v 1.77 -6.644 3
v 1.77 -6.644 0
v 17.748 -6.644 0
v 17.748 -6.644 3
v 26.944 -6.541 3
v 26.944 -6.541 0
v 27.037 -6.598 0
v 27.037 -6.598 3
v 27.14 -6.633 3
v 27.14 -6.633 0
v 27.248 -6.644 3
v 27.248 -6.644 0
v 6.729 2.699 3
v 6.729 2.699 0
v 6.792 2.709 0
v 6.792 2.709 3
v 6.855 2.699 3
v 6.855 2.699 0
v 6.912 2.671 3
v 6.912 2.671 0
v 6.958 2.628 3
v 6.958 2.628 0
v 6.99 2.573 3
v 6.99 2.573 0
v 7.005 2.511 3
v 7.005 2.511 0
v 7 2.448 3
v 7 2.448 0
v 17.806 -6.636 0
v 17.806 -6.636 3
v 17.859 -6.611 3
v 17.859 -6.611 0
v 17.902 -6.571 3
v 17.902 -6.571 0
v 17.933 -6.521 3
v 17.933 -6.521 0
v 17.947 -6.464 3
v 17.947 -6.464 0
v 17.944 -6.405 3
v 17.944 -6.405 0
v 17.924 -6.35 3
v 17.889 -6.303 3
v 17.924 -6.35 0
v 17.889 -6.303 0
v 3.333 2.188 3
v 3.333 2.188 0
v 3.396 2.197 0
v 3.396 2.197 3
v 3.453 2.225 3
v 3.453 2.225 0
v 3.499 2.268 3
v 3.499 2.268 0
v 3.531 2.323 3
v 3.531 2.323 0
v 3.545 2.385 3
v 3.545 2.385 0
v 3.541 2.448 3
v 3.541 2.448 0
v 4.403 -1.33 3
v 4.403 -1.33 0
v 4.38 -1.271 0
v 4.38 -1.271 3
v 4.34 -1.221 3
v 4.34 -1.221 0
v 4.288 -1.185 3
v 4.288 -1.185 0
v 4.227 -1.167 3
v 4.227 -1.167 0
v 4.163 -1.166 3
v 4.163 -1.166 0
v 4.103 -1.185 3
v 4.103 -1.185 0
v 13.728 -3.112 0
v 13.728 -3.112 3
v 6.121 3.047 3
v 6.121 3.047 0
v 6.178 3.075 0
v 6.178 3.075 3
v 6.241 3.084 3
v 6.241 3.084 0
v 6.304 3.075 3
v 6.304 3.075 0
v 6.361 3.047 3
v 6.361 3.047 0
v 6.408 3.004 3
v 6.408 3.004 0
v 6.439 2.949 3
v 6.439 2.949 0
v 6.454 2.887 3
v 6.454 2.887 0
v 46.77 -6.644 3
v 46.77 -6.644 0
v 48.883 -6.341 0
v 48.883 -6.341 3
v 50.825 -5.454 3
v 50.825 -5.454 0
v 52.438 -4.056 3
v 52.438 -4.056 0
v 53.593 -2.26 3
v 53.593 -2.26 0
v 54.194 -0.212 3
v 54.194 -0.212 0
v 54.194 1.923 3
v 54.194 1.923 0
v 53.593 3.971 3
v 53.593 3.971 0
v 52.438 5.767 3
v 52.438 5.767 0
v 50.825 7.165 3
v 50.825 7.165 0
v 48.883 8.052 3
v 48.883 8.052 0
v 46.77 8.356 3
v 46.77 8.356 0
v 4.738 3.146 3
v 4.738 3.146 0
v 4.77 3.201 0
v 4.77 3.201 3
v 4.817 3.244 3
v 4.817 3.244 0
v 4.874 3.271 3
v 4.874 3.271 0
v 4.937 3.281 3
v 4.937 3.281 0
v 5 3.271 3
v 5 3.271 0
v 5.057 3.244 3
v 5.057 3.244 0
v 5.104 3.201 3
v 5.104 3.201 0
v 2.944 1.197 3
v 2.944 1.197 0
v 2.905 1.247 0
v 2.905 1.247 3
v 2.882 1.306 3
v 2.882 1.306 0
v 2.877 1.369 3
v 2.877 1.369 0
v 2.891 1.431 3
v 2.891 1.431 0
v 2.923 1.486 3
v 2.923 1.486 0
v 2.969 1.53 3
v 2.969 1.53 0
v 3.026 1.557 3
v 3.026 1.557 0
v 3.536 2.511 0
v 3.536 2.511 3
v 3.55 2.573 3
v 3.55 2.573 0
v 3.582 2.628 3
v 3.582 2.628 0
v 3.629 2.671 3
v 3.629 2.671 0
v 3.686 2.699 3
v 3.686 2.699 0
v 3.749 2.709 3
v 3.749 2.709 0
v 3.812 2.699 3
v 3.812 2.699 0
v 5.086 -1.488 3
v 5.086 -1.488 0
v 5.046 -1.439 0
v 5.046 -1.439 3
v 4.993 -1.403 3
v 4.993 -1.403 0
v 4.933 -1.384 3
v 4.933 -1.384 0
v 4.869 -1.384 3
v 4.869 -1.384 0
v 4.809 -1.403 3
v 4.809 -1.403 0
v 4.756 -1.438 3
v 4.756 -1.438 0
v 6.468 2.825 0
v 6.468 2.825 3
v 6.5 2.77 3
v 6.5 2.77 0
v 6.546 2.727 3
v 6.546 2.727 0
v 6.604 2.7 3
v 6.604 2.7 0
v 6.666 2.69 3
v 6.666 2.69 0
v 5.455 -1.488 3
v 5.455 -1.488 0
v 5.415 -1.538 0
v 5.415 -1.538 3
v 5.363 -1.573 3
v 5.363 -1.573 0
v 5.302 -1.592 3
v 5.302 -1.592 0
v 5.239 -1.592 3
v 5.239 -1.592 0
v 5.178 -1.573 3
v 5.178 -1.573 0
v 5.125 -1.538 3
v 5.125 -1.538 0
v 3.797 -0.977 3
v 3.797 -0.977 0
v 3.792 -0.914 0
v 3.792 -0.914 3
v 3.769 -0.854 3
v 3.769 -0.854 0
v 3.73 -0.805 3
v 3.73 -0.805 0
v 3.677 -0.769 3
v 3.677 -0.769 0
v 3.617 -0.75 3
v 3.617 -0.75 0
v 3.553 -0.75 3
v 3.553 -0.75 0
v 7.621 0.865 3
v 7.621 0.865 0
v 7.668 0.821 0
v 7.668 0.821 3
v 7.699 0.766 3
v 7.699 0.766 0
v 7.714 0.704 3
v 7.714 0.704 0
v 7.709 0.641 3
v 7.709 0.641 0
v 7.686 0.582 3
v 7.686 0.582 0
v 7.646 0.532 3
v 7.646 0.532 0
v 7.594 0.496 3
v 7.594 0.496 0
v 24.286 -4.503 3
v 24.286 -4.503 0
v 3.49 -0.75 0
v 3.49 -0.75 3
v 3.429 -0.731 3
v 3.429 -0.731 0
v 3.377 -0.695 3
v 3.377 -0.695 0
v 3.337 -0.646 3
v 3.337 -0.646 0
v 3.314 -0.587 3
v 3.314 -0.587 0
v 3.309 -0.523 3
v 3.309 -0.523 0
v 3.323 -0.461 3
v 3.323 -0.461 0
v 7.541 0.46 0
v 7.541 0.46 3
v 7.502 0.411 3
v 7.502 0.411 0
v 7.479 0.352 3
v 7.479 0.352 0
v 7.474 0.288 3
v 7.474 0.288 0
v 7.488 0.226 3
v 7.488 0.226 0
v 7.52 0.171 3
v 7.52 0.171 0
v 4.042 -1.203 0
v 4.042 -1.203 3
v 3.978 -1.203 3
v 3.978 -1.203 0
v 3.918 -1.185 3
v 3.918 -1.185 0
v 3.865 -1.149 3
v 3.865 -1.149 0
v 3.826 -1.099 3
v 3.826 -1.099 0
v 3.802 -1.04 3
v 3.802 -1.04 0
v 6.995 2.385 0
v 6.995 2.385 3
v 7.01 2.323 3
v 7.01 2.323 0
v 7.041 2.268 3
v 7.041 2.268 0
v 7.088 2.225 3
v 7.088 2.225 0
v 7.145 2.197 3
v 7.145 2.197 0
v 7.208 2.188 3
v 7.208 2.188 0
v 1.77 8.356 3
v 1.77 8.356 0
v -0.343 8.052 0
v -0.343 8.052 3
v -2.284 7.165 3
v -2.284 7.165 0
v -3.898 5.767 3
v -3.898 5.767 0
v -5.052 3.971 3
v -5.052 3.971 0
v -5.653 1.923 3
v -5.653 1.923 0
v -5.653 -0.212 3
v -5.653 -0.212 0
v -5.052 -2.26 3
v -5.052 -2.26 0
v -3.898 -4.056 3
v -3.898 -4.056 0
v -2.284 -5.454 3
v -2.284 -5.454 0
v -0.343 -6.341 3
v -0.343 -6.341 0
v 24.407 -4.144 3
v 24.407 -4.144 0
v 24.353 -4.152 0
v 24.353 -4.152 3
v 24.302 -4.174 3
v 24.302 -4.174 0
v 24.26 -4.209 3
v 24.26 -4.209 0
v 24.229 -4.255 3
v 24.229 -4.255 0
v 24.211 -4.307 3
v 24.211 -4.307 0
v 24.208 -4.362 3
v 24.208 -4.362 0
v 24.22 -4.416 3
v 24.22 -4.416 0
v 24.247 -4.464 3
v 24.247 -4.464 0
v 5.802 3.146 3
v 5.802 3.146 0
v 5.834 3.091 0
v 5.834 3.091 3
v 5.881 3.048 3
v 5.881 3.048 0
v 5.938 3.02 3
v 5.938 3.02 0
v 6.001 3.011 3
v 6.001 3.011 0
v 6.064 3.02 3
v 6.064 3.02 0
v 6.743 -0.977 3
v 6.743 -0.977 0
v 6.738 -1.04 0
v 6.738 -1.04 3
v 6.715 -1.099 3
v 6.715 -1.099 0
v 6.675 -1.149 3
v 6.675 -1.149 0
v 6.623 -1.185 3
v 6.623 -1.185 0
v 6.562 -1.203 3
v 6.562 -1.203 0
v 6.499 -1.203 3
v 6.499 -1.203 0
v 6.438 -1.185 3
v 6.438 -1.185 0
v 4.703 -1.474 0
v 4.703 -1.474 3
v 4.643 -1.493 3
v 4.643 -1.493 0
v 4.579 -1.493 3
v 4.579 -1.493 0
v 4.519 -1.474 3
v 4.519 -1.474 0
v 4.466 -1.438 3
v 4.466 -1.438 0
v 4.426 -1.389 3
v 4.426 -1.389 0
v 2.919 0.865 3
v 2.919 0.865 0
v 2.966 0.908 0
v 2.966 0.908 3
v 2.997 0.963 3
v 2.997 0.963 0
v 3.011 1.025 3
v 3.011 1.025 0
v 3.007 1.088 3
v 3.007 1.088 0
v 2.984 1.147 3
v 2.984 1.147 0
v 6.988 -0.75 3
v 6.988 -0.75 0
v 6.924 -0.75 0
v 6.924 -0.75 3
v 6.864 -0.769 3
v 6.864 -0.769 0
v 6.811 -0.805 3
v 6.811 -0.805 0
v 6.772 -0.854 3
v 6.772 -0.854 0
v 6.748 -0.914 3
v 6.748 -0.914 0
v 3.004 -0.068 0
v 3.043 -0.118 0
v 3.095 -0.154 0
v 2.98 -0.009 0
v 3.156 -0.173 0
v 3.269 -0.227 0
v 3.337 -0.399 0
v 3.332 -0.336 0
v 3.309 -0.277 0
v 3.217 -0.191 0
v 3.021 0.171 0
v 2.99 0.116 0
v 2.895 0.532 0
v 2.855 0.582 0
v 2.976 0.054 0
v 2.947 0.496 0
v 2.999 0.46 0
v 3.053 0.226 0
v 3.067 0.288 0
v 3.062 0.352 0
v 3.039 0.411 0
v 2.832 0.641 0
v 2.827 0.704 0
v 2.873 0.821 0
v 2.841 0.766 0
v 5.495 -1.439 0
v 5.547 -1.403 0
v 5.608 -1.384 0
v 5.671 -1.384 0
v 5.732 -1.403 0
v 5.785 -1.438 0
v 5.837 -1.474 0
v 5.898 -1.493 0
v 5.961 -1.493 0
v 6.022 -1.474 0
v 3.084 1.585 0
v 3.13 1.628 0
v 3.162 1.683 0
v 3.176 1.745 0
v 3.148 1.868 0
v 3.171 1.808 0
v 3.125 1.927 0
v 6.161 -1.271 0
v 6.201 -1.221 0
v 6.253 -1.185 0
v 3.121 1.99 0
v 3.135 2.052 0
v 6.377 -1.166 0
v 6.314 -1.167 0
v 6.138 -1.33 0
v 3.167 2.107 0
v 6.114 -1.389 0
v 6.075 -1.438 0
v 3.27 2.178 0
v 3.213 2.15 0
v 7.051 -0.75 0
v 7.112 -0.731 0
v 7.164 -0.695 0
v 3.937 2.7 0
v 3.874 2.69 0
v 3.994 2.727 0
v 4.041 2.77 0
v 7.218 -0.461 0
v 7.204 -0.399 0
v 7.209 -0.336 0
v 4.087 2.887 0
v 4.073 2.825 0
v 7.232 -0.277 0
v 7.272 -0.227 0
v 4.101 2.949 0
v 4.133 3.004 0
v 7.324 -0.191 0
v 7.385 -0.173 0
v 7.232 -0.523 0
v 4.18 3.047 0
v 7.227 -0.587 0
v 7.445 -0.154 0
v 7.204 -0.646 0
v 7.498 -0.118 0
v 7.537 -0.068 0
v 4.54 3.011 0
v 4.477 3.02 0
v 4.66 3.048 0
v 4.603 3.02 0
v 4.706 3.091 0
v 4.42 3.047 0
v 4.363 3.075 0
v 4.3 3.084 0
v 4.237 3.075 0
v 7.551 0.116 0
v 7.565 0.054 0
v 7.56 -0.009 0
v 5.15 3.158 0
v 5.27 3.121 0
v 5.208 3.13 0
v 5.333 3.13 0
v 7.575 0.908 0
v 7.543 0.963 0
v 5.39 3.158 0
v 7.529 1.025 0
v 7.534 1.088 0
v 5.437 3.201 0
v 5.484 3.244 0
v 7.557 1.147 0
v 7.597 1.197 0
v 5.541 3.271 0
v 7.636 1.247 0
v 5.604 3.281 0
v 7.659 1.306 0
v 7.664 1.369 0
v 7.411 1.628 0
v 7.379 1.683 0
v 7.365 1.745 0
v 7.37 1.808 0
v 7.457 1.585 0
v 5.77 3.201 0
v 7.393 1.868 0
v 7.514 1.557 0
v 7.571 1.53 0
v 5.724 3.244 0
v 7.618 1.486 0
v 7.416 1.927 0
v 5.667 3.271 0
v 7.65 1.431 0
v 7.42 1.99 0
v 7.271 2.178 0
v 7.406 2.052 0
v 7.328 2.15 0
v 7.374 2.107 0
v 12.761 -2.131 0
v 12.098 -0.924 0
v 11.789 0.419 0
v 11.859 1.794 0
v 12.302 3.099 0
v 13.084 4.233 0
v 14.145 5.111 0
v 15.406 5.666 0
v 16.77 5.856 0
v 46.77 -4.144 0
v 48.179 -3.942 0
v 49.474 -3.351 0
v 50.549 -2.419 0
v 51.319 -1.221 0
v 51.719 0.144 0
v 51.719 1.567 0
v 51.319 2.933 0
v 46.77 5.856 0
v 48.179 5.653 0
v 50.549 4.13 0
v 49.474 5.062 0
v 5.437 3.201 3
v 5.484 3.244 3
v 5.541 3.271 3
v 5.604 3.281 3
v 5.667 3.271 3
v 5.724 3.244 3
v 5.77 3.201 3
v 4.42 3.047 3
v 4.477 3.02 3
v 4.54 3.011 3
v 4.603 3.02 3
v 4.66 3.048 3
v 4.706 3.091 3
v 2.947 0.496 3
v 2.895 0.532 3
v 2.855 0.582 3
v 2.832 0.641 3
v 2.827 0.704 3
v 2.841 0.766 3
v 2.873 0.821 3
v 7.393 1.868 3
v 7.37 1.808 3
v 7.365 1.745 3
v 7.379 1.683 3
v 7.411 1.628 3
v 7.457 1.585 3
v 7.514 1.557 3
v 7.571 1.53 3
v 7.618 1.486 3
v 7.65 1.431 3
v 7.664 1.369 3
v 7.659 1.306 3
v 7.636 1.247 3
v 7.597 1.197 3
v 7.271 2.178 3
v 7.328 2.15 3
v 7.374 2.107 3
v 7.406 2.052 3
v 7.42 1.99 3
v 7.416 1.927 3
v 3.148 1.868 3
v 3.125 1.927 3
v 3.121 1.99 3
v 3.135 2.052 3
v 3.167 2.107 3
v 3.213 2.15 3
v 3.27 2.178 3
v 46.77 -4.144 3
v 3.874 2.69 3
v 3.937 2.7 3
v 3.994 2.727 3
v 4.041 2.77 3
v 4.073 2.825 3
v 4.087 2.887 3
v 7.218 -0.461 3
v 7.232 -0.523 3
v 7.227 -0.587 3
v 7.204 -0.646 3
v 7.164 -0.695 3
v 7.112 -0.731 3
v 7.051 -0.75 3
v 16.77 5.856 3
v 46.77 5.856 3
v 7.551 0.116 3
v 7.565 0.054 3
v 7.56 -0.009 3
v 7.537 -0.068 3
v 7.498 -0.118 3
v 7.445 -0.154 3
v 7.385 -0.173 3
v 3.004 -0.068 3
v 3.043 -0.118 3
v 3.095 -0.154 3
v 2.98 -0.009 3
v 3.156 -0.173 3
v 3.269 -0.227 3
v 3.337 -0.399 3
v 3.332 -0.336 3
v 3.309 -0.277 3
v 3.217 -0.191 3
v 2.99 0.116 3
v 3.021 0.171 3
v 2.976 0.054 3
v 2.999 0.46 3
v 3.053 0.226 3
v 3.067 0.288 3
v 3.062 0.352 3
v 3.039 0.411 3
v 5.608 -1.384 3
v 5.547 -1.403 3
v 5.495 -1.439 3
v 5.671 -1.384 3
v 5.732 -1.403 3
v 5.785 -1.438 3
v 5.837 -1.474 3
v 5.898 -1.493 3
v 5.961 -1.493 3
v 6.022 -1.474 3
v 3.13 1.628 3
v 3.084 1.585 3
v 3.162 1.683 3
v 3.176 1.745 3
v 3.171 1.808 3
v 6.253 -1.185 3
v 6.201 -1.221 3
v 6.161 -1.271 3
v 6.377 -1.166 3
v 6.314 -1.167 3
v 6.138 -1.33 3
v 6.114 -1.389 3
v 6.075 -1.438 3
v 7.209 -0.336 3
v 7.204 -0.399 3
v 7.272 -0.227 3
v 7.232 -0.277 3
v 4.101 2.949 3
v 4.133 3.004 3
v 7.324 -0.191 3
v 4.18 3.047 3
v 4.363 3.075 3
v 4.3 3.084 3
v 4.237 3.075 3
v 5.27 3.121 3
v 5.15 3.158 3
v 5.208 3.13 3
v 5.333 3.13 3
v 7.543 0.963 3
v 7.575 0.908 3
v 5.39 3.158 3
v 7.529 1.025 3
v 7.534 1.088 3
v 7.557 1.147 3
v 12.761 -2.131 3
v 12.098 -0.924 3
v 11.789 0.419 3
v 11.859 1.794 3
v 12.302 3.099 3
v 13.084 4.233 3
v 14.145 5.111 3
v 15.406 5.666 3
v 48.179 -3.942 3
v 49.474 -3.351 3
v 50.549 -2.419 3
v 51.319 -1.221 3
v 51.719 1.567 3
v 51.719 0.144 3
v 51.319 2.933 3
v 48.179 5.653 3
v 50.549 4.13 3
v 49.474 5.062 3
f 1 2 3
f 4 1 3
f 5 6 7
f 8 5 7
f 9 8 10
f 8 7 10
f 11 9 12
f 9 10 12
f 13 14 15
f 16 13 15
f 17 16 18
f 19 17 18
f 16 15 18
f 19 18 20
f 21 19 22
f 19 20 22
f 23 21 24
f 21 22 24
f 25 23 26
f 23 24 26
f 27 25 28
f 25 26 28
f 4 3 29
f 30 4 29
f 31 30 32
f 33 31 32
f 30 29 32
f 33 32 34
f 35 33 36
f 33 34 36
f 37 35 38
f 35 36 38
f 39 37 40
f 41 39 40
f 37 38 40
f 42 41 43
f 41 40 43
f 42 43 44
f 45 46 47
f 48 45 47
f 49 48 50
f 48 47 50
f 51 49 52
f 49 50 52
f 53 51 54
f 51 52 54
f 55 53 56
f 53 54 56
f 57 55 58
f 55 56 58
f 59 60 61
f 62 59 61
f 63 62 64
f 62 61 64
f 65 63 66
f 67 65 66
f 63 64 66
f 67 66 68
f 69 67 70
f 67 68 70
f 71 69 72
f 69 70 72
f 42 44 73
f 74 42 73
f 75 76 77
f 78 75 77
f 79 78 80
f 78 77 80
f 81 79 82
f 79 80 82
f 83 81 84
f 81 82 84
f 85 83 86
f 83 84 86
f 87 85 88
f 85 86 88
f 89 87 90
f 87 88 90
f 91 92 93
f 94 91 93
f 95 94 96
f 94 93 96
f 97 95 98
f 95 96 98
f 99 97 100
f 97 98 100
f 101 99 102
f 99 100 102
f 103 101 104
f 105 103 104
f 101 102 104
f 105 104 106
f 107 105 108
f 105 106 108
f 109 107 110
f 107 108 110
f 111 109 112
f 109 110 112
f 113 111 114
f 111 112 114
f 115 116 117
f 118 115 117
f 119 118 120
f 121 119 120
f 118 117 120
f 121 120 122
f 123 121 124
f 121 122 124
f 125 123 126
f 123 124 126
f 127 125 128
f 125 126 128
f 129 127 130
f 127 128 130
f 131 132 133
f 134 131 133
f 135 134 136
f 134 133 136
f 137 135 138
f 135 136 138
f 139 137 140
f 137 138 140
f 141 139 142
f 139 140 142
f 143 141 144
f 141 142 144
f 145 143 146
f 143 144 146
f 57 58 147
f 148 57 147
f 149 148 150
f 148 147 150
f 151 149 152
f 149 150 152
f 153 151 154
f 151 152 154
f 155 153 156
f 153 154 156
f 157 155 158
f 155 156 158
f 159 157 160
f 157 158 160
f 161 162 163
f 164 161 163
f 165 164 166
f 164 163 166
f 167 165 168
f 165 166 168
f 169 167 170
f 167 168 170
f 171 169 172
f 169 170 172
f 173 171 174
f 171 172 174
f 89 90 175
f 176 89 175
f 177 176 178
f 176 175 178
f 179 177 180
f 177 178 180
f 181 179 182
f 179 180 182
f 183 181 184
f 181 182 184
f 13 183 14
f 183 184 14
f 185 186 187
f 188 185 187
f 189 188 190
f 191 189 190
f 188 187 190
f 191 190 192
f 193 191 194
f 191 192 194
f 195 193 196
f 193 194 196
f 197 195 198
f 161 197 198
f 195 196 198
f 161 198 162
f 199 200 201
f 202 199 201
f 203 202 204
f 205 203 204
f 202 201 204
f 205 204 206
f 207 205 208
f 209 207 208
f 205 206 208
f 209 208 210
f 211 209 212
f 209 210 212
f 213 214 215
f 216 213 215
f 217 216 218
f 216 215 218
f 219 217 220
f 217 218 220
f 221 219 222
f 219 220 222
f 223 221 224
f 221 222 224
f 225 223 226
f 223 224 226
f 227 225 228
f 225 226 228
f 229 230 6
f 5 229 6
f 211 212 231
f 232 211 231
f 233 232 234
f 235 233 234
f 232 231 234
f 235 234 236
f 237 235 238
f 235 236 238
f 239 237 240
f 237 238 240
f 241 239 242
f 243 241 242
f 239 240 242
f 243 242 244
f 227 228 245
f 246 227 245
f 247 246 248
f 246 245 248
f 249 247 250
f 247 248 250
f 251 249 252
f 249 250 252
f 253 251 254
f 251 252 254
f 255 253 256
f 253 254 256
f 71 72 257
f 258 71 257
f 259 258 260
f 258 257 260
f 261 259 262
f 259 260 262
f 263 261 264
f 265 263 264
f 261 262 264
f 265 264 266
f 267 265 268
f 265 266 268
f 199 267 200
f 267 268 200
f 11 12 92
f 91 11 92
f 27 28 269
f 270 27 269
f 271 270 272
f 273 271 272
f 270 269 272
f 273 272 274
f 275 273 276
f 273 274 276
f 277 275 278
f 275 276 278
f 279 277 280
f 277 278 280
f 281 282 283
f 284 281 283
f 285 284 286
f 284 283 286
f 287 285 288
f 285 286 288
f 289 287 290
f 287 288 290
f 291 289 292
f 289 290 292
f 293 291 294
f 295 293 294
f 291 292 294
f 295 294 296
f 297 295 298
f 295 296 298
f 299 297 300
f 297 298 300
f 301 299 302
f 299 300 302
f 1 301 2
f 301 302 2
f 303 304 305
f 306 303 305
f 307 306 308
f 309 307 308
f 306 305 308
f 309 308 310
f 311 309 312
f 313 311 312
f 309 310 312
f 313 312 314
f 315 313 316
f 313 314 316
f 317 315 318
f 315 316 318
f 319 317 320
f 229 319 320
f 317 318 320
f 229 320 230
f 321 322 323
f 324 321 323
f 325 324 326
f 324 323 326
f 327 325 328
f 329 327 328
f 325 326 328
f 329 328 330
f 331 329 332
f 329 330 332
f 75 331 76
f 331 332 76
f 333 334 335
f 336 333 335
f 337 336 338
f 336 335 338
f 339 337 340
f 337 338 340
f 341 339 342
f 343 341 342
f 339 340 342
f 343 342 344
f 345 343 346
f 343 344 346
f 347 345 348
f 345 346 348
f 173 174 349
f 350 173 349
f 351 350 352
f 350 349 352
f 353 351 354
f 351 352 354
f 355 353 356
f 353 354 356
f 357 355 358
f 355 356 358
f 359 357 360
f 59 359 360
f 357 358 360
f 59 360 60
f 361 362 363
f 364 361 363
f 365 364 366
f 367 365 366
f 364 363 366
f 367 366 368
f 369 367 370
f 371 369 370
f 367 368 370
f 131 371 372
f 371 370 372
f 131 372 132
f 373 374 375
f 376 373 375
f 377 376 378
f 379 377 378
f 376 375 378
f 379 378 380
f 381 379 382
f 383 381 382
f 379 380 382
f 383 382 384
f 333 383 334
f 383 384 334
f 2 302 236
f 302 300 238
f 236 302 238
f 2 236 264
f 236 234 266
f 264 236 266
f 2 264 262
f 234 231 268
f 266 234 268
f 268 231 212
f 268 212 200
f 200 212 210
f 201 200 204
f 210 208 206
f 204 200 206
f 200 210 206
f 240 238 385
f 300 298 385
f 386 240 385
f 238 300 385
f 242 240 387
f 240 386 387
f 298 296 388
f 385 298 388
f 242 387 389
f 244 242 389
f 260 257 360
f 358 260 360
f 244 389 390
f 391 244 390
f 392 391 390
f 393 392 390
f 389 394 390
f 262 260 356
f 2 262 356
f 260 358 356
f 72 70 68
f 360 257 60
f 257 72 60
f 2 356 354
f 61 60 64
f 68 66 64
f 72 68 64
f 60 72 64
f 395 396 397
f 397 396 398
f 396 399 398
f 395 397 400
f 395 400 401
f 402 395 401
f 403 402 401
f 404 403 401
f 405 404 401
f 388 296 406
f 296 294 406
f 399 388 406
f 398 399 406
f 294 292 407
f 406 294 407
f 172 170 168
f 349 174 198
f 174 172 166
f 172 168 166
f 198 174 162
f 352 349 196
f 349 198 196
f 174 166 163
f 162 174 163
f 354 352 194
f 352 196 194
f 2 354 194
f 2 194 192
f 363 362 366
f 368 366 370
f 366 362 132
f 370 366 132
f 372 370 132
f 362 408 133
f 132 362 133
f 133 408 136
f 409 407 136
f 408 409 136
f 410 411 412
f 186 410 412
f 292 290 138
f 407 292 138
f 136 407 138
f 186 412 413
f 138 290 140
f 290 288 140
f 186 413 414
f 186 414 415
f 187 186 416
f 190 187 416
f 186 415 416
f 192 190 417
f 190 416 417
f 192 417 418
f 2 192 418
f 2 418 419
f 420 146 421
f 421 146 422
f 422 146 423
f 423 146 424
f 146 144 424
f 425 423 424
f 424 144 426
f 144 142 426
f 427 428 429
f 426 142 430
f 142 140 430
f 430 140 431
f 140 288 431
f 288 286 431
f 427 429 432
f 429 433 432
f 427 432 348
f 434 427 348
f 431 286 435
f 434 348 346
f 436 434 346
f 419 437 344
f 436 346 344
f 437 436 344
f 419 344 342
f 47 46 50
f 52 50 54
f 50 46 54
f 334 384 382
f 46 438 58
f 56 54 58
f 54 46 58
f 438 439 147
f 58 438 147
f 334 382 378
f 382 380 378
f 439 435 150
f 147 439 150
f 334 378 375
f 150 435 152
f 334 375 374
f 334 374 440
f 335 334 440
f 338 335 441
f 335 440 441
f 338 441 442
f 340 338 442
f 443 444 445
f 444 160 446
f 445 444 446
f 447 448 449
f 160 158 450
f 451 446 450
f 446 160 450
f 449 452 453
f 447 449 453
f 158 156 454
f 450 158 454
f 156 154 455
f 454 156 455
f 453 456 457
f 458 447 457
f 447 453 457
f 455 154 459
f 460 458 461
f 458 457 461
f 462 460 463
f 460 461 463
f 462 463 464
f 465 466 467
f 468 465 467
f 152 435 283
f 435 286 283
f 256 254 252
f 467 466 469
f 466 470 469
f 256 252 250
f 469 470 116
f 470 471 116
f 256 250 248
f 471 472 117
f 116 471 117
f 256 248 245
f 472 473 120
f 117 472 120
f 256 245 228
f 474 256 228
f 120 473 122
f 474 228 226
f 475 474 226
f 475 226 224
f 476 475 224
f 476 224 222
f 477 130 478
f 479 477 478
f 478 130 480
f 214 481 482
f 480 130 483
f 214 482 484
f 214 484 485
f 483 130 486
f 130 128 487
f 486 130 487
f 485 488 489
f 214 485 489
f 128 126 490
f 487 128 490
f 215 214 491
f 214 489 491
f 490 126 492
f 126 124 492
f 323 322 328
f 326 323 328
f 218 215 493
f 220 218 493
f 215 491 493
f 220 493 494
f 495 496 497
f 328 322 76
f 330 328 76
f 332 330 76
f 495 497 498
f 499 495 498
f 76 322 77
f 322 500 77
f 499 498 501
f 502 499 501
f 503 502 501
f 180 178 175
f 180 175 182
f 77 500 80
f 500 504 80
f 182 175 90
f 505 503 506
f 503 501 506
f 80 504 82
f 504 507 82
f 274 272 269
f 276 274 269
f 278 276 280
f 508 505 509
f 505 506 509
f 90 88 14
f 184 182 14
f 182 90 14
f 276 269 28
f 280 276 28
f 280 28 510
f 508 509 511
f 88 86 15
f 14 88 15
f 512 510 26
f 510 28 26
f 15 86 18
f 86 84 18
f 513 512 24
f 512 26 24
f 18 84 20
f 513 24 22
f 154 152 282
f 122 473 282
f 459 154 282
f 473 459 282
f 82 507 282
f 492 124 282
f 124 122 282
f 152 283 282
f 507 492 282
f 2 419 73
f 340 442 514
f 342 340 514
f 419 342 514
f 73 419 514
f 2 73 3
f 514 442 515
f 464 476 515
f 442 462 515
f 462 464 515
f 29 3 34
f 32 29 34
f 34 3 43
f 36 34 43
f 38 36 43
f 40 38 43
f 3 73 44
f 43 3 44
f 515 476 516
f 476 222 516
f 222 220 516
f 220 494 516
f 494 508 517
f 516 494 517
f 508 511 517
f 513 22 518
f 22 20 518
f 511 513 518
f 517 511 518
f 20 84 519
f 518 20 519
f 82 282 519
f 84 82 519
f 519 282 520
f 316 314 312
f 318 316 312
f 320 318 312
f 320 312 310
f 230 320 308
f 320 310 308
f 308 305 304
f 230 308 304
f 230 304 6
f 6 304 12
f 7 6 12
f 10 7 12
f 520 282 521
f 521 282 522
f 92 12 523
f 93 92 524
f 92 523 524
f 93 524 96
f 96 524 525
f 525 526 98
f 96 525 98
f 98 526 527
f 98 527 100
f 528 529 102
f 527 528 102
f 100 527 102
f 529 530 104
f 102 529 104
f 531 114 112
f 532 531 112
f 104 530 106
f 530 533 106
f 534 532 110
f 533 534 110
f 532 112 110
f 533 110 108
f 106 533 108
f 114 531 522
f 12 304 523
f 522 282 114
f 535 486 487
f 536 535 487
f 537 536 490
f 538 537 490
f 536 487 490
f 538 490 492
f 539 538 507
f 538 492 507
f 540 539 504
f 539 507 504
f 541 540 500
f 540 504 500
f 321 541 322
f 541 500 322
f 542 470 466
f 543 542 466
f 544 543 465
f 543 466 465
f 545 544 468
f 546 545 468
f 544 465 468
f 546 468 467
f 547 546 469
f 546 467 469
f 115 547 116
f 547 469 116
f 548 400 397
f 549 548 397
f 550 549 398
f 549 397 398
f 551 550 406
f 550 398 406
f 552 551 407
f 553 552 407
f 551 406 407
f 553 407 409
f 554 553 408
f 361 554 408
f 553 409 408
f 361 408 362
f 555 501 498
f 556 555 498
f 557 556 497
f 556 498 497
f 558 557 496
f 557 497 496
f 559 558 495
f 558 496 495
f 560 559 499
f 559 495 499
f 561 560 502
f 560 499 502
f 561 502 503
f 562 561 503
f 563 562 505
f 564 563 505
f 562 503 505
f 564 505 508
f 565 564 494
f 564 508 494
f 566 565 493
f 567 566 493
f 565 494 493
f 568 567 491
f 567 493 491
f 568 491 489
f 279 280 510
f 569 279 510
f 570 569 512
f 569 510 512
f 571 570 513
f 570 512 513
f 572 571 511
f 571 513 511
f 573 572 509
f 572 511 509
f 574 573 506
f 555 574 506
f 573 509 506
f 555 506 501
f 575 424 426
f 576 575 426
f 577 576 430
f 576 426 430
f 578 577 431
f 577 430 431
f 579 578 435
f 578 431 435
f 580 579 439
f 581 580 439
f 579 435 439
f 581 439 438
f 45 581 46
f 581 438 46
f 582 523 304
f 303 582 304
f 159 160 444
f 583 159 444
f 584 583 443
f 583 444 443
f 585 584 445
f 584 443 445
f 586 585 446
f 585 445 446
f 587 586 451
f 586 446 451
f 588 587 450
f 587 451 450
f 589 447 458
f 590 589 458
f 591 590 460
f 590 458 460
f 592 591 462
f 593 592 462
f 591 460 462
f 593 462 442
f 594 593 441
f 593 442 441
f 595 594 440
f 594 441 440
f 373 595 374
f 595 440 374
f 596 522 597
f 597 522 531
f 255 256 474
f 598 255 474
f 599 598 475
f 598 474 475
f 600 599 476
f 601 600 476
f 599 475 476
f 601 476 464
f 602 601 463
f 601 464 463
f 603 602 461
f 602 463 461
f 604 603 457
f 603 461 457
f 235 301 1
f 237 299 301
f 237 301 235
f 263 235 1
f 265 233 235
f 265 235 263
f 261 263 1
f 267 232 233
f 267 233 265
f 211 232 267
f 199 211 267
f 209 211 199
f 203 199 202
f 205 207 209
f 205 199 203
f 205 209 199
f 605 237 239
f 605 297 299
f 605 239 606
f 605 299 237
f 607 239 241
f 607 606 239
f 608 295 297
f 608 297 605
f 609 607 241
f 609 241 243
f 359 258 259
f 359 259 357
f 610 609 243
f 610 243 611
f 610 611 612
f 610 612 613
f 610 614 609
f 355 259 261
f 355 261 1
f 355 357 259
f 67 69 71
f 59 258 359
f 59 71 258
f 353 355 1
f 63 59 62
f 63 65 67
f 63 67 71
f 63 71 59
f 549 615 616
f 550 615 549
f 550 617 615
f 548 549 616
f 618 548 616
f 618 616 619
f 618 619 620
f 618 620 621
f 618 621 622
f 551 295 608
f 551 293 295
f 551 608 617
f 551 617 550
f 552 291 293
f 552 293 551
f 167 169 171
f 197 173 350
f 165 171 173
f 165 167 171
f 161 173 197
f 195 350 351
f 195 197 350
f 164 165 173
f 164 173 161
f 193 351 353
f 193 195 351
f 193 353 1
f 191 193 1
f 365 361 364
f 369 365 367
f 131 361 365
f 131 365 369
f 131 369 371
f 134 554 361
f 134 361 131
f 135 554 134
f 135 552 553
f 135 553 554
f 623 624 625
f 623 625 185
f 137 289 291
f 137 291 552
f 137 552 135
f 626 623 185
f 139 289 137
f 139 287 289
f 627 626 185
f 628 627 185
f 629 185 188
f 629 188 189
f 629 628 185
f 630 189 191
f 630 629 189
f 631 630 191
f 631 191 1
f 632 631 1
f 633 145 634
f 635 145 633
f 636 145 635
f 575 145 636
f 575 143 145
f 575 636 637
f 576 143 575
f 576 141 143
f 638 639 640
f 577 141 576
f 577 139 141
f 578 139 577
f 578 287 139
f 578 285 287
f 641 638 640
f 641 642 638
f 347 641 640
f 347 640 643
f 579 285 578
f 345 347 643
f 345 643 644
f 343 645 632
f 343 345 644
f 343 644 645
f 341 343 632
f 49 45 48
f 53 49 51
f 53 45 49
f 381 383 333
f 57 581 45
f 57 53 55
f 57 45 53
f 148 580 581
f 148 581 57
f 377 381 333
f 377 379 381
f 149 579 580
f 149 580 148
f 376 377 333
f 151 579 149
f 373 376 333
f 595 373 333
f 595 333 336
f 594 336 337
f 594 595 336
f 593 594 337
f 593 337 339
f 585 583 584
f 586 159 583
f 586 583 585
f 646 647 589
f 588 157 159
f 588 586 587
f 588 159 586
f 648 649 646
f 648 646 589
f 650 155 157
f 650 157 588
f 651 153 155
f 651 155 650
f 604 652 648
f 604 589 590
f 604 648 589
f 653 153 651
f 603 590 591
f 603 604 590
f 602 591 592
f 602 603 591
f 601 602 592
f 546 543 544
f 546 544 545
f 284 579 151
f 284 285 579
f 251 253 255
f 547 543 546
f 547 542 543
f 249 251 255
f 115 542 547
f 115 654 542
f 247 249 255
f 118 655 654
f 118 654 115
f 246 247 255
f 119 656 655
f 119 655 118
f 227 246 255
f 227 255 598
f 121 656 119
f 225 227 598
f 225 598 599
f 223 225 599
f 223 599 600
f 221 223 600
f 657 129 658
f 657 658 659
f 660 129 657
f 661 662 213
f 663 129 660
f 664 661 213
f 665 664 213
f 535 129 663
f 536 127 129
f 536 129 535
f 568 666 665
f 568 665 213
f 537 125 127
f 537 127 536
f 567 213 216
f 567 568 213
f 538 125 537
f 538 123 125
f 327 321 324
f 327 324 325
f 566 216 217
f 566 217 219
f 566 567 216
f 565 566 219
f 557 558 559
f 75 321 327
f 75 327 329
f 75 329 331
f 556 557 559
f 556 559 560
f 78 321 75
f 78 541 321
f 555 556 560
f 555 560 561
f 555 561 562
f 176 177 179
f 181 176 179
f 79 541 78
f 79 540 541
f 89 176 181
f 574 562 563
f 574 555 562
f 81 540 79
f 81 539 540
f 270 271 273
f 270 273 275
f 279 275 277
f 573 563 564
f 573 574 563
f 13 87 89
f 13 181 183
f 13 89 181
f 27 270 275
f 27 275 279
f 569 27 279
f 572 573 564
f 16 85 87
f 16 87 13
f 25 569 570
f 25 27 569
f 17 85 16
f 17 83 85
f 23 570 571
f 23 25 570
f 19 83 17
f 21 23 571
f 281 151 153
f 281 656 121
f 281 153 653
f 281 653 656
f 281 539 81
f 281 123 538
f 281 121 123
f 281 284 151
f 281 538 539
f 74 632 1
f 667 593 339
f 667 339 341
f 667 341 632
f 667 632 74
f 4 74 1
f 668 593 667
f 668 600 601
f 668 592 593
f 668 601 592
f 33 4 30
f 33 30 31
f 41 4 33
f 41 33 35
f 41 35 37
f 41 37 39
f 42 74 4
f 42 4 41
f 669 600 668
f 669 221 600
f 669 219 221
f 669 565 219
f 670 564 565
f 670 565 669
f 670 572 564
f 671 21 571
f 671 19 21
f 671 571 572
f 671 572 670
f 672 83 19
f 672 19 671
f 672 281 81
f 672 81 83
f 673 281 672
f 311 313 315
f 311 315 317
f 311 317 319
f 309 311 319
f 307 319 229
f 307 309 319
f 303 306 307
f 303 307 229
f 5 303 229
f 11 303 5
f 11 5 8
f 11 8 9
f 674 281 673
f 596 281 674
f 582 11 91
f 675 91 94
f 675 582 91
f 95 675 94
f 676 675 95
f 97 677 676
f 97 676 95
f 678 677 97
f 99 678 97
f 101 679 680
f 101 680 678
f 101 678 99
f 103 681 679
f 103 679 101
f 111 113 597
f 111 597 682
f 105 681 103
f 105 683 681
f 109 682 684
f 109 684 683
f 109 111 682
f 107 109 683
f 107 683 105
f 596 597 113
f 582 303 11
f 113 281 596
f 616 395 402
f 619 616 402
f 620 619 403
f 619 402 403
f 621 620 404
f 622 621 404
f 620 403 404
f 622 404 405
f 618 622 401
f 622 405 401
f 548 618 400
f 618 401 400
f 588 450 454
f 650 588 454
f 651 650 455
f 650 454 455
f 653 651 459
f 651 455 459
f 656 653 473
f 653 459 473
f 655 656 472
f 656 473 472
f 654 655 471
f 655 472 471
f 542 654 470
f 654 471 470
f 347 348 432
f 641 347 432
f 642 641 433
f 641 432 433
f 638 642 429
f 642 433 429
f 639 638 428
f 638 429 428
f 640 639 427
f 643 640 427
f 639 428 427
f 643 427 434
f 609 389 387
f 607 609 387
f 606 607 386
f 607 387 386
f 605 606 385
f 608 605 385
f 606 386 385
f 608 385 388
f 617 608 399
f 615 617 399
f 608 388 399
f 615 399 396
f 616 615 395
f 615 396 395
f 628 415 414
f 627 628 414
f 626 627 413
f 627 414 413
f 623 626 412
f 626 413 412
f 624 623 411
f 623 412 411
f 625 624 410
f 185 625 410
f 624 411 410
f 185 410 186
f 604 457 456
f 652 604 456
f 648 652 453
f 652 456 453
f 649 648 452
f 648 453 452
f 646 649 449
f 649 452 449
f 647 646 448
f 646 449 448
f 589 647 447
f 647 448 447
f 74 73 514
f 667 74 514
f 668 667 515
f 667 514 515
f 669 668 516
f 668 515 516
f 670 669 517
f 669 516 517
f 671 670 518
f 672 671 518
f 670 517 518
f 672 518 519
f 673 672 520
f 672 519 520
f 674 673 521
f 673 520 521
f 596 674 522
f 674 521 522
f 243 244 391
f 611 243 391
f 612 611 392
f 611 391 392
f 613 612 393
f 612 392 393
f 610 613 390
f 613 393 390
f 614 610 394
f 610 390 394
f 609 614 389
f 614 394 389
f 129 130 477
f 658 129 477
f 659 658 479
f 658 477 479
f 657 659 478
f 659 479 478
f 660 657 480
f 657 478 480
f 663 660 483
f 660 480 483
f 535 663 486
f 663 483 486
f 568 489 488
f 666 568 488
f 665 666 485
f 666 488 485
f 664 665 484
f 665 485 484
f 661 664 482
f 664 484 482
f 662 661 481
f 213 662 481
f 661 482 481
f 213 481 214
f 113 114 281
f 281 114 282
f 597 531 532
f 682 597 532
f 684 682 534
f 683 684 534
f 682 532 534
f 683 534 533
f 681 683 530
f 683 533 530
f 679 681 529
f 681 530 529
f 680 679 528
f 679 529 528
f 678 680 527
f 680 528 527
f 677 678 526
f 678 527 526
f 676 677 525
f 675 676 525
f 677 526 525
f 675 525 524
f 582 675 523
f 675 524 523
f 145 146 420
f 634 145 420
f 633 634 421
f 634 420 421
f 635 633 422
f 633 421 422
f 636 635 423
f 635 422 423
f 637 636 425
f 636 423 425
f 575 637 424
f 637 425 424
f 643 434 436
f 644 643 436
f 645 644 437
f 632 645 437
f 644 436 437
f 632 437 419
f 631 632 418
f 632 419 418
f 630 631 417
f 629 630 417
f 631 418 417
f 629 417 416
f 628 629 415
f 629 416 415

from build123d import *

# Parameters (mm, degrees)
BOSS_EXTRUDE1_DEPTH = 3


with BuildPart() as part:
    # Sketch2 → Boss-Extrude1 (new body)
    with BuildSketch(Plane.XY):
        with BuildLine():
            ThreePointArc((13.72796065, -3.112181063), (12.035436414, 2.462021021), (16.770370099, 5.855657737))
            Line((16.770370099, 5.855657737), (46.770370099, 5.855657737))
            ThreePointArc((46.770370099, 5.855657737), (51.770370099, 0.855657737), (46.770370099, -4.144342263))
            Line((46.770370099, -4.144342263), (24.407279181, -4.144342263))
            ThreePointArc((24.407279181, -4.144342263), (24.217881833, -4.280087732), (24.285582803, -4.503055815))
            Line((24.285582803, -4.503055815), (26.943586158, -6.541126143))
            ThreePointArc((26.943586158, -6.541126143), (27.087190775, -6.617835631), (27.247827103, -6.644342263))
            Line((27.247827103, -6.644342263), (46.770370099, -6.644342263))
            ThreePointArc((46.770370099, -6.644342263), (54.270370099, 0.855657737), (46.770370099, 8.355657737))
            Line((46.770370099, 8.355657737), (1.770370099, 8.355657737))
            ThreePointArc((1.770370099, 8.355657737), (-5.729629901, 0.855657737), (1.770370099, -6.644342263))
            Line((1.770370099, -6.644342263), (17.747827103, -6.644342263))
            ThreePointArc((17.747827103, -6.644342263), (17.93260301, -6.520878949), (17.889248459, -6.302920907))
            Line((17.889248459, -6.302920907), (13.72796065, -3.112181063))
        make_face()
        with BuildLine():
            ThreePointArc((5.103723485, 3.20079905), (5.270370099, 3.120917237), (5.437016713, 3.20079905))
            ThreePointArc((5.437016713, 3.20079905), (5.635523651, 3.278293261), (5.802369663, 3.145730953))
            ThreePointArc((5.802369663, 3.145730953), (5.938067058, 3.020278113), (6.120855608, 3.047491049))
            ThreePointArc((6.120855608, 3.047491049), (6.33338526, 3.063031463), (6.453745345, 2.887179801))
            ThreePointArc((6.453745345, 2.887179801), (6.546436212, 2.727302969), (6.729125133, 2.699429041))
            ThreePointArc((6.729125133, 2.699429041), (6.936793306, 2.651634823), (6.999972944, 2.448118998))
            ThreePointArc((6.999972944, 2.448118998), (7.041421292, 2.268023934), (7.207777872, 2.18753986))
            ThreePointArc((7.207777872, 2.18753986), (7.392132338, 2.080657737), (7.392517739, 1.867561025))
            ThreePointArc((7.392517739, 1.867561025), (7.379040701, 1.683249963), (7.514283428, 1.557307108))
            ThreePointArc((7.514283428, 1.557307108), (7.658943484, 1.400834025), (7.596500404, 1.197091003))
            ThreePointArc((7.596500404, 1.197091003), (7.529295473, 1.024940791), (7.621407438, 0.864729731))
            ThreePointArc((7.621407438, 0.864729731), (7.713519402, 0.672569008), (7.593796183, 0.496283137))
            ThreePointArc((7.593796183, 0.496283137), (7.478834813, 0.351590078), (7.519631462, 0.171346267))
            ThreePointArc((7.519631462, 0.171346267), (7.551010783, -0.039427773), (7.384645358, -0.172592718))
            ThreePointArc((7.384645358, -0.172592718), (7.232142372, -0.276972013), (7.217998744, -0.46123312))
            ThreePointArc((7.217998744, -0.46123312), (7.185857231, -0.671892277), (6.987631898, -0.750104008))
            ThreePointArc((6.987631898, -0.750104008), (6.811137854, -0.804894979), (6.743310674, -0.976800975))
            ThreePointArc((6.743310674, -0.976800975), (6.650504241, -1.16862726), (6.438032191, -1.18493632))
            ThreePointArc((6.438032191, -1.18493632), (6.253229361, -1.18527055), (6.137745369, -1.329546832))
            ThreePointArc((6.137745369, -1.329546832), (5.992520276, -1.485495637), (5.784680583, -1.438452896))
            ThreePointArc((5.784680583, -1.438452896), (5.607989508, -1.384300685), (5.455109966, -1.488127674))
            ThreePointArc((5.455109966, -1.488127674), (5.270370099, -1.594342263), (5.085630232, -1.488127674))
            ThreePointArc((5.085630232, -1.488127674), (4.93275069, -1.384300685), (4.756059614, -1.438452896))
            ThreePointArc((4.756059614, -1.438452896), (4.548219922, -1.485495637), (4.402994828, -1.329546832))
            ThreePointArc((4.402994828, -1.329546832), (4.287510837, -1.18527055), (4.102708006, -1.18493632))
            ThreePointArc((4.102708006, -1.18493632), (3.890235957, -1.16862726), (3.797429524, -0.976800975))
            ThreePointArc((3.797429524, -0.976800975), (3.729602343, -0.804894979), (3.5531083, -0.750104008))
            ThreePointArc((3.5531083, -0.750104008), (3.354882967, -0.671892277), (3.322741454, -0.46123312))
            ThreePointArc((3.322741454, -0.46123312), (3.308597826, -0.276972013), (3.15609484, -0.172592718))
            ThreePointArc((3.15609484, -0.172592718), (2.989729415, -0.039427773), (3.021108735, 0.171346267))
            ThreePointArc((3.021108735, 0.171346267), (3.061905384, 0.351590078), (2.946944015, 0.496283137))
            ThreePointArc((2.946944015, 0.496283137), (2.827220796, 0.672569008), (2.91933276, 0.864729731))
            ThreePointArc((2.91933276, 0.864729731), (3.011444724, 1.024940791), (2.944239794, 1.197091003))
            ThreePointArc((2.944239794, 1.197091003), (2.881796714, 1.400834025), (3.02645677, 1.557307108))
            ThreePointArc((3.02645677, 1.557307108), (3.161699497, 1.683249963), (3.148222459, 1.867561025))
            ThreePointArc((3.148222459, 1.867561025), (3.14860786, 2.080657737), (3.332962326, 2.18753986))
            ThreePointArc((3.332962326, 2.18753986), (3.499318906, 2.268023934), (3.540767254, 2.448118998))
            ThreePointArc((3.540767254, 2.448118998), (3.603946891, 2.651634823), (3.811615065, 2.699429041))
            ThreePointArc((3.811615065, 2.699429041), (3.994303986, 2.727302969), (4.086994852, 2.887179801))
            ThreePointArc((4.086994852, 2.887179801), (4.207354938, 3.063031463), (4.41988459, 3.047491049))
            ThreePointArc((4.41988459, 3.047491049), (4.60267314, 3.020278113), (4.738370535, 3.145730953))
            ThreePointArc((4.738370535, 3.145730953), (4.905216547, 3.278293261), (5.103723485, 3.20079905))
        make_face(mode=Mode.SUBTRACT)
    extrude(amount=BOSS_EXTRUDE1_DEPTH)


solid = part.part
